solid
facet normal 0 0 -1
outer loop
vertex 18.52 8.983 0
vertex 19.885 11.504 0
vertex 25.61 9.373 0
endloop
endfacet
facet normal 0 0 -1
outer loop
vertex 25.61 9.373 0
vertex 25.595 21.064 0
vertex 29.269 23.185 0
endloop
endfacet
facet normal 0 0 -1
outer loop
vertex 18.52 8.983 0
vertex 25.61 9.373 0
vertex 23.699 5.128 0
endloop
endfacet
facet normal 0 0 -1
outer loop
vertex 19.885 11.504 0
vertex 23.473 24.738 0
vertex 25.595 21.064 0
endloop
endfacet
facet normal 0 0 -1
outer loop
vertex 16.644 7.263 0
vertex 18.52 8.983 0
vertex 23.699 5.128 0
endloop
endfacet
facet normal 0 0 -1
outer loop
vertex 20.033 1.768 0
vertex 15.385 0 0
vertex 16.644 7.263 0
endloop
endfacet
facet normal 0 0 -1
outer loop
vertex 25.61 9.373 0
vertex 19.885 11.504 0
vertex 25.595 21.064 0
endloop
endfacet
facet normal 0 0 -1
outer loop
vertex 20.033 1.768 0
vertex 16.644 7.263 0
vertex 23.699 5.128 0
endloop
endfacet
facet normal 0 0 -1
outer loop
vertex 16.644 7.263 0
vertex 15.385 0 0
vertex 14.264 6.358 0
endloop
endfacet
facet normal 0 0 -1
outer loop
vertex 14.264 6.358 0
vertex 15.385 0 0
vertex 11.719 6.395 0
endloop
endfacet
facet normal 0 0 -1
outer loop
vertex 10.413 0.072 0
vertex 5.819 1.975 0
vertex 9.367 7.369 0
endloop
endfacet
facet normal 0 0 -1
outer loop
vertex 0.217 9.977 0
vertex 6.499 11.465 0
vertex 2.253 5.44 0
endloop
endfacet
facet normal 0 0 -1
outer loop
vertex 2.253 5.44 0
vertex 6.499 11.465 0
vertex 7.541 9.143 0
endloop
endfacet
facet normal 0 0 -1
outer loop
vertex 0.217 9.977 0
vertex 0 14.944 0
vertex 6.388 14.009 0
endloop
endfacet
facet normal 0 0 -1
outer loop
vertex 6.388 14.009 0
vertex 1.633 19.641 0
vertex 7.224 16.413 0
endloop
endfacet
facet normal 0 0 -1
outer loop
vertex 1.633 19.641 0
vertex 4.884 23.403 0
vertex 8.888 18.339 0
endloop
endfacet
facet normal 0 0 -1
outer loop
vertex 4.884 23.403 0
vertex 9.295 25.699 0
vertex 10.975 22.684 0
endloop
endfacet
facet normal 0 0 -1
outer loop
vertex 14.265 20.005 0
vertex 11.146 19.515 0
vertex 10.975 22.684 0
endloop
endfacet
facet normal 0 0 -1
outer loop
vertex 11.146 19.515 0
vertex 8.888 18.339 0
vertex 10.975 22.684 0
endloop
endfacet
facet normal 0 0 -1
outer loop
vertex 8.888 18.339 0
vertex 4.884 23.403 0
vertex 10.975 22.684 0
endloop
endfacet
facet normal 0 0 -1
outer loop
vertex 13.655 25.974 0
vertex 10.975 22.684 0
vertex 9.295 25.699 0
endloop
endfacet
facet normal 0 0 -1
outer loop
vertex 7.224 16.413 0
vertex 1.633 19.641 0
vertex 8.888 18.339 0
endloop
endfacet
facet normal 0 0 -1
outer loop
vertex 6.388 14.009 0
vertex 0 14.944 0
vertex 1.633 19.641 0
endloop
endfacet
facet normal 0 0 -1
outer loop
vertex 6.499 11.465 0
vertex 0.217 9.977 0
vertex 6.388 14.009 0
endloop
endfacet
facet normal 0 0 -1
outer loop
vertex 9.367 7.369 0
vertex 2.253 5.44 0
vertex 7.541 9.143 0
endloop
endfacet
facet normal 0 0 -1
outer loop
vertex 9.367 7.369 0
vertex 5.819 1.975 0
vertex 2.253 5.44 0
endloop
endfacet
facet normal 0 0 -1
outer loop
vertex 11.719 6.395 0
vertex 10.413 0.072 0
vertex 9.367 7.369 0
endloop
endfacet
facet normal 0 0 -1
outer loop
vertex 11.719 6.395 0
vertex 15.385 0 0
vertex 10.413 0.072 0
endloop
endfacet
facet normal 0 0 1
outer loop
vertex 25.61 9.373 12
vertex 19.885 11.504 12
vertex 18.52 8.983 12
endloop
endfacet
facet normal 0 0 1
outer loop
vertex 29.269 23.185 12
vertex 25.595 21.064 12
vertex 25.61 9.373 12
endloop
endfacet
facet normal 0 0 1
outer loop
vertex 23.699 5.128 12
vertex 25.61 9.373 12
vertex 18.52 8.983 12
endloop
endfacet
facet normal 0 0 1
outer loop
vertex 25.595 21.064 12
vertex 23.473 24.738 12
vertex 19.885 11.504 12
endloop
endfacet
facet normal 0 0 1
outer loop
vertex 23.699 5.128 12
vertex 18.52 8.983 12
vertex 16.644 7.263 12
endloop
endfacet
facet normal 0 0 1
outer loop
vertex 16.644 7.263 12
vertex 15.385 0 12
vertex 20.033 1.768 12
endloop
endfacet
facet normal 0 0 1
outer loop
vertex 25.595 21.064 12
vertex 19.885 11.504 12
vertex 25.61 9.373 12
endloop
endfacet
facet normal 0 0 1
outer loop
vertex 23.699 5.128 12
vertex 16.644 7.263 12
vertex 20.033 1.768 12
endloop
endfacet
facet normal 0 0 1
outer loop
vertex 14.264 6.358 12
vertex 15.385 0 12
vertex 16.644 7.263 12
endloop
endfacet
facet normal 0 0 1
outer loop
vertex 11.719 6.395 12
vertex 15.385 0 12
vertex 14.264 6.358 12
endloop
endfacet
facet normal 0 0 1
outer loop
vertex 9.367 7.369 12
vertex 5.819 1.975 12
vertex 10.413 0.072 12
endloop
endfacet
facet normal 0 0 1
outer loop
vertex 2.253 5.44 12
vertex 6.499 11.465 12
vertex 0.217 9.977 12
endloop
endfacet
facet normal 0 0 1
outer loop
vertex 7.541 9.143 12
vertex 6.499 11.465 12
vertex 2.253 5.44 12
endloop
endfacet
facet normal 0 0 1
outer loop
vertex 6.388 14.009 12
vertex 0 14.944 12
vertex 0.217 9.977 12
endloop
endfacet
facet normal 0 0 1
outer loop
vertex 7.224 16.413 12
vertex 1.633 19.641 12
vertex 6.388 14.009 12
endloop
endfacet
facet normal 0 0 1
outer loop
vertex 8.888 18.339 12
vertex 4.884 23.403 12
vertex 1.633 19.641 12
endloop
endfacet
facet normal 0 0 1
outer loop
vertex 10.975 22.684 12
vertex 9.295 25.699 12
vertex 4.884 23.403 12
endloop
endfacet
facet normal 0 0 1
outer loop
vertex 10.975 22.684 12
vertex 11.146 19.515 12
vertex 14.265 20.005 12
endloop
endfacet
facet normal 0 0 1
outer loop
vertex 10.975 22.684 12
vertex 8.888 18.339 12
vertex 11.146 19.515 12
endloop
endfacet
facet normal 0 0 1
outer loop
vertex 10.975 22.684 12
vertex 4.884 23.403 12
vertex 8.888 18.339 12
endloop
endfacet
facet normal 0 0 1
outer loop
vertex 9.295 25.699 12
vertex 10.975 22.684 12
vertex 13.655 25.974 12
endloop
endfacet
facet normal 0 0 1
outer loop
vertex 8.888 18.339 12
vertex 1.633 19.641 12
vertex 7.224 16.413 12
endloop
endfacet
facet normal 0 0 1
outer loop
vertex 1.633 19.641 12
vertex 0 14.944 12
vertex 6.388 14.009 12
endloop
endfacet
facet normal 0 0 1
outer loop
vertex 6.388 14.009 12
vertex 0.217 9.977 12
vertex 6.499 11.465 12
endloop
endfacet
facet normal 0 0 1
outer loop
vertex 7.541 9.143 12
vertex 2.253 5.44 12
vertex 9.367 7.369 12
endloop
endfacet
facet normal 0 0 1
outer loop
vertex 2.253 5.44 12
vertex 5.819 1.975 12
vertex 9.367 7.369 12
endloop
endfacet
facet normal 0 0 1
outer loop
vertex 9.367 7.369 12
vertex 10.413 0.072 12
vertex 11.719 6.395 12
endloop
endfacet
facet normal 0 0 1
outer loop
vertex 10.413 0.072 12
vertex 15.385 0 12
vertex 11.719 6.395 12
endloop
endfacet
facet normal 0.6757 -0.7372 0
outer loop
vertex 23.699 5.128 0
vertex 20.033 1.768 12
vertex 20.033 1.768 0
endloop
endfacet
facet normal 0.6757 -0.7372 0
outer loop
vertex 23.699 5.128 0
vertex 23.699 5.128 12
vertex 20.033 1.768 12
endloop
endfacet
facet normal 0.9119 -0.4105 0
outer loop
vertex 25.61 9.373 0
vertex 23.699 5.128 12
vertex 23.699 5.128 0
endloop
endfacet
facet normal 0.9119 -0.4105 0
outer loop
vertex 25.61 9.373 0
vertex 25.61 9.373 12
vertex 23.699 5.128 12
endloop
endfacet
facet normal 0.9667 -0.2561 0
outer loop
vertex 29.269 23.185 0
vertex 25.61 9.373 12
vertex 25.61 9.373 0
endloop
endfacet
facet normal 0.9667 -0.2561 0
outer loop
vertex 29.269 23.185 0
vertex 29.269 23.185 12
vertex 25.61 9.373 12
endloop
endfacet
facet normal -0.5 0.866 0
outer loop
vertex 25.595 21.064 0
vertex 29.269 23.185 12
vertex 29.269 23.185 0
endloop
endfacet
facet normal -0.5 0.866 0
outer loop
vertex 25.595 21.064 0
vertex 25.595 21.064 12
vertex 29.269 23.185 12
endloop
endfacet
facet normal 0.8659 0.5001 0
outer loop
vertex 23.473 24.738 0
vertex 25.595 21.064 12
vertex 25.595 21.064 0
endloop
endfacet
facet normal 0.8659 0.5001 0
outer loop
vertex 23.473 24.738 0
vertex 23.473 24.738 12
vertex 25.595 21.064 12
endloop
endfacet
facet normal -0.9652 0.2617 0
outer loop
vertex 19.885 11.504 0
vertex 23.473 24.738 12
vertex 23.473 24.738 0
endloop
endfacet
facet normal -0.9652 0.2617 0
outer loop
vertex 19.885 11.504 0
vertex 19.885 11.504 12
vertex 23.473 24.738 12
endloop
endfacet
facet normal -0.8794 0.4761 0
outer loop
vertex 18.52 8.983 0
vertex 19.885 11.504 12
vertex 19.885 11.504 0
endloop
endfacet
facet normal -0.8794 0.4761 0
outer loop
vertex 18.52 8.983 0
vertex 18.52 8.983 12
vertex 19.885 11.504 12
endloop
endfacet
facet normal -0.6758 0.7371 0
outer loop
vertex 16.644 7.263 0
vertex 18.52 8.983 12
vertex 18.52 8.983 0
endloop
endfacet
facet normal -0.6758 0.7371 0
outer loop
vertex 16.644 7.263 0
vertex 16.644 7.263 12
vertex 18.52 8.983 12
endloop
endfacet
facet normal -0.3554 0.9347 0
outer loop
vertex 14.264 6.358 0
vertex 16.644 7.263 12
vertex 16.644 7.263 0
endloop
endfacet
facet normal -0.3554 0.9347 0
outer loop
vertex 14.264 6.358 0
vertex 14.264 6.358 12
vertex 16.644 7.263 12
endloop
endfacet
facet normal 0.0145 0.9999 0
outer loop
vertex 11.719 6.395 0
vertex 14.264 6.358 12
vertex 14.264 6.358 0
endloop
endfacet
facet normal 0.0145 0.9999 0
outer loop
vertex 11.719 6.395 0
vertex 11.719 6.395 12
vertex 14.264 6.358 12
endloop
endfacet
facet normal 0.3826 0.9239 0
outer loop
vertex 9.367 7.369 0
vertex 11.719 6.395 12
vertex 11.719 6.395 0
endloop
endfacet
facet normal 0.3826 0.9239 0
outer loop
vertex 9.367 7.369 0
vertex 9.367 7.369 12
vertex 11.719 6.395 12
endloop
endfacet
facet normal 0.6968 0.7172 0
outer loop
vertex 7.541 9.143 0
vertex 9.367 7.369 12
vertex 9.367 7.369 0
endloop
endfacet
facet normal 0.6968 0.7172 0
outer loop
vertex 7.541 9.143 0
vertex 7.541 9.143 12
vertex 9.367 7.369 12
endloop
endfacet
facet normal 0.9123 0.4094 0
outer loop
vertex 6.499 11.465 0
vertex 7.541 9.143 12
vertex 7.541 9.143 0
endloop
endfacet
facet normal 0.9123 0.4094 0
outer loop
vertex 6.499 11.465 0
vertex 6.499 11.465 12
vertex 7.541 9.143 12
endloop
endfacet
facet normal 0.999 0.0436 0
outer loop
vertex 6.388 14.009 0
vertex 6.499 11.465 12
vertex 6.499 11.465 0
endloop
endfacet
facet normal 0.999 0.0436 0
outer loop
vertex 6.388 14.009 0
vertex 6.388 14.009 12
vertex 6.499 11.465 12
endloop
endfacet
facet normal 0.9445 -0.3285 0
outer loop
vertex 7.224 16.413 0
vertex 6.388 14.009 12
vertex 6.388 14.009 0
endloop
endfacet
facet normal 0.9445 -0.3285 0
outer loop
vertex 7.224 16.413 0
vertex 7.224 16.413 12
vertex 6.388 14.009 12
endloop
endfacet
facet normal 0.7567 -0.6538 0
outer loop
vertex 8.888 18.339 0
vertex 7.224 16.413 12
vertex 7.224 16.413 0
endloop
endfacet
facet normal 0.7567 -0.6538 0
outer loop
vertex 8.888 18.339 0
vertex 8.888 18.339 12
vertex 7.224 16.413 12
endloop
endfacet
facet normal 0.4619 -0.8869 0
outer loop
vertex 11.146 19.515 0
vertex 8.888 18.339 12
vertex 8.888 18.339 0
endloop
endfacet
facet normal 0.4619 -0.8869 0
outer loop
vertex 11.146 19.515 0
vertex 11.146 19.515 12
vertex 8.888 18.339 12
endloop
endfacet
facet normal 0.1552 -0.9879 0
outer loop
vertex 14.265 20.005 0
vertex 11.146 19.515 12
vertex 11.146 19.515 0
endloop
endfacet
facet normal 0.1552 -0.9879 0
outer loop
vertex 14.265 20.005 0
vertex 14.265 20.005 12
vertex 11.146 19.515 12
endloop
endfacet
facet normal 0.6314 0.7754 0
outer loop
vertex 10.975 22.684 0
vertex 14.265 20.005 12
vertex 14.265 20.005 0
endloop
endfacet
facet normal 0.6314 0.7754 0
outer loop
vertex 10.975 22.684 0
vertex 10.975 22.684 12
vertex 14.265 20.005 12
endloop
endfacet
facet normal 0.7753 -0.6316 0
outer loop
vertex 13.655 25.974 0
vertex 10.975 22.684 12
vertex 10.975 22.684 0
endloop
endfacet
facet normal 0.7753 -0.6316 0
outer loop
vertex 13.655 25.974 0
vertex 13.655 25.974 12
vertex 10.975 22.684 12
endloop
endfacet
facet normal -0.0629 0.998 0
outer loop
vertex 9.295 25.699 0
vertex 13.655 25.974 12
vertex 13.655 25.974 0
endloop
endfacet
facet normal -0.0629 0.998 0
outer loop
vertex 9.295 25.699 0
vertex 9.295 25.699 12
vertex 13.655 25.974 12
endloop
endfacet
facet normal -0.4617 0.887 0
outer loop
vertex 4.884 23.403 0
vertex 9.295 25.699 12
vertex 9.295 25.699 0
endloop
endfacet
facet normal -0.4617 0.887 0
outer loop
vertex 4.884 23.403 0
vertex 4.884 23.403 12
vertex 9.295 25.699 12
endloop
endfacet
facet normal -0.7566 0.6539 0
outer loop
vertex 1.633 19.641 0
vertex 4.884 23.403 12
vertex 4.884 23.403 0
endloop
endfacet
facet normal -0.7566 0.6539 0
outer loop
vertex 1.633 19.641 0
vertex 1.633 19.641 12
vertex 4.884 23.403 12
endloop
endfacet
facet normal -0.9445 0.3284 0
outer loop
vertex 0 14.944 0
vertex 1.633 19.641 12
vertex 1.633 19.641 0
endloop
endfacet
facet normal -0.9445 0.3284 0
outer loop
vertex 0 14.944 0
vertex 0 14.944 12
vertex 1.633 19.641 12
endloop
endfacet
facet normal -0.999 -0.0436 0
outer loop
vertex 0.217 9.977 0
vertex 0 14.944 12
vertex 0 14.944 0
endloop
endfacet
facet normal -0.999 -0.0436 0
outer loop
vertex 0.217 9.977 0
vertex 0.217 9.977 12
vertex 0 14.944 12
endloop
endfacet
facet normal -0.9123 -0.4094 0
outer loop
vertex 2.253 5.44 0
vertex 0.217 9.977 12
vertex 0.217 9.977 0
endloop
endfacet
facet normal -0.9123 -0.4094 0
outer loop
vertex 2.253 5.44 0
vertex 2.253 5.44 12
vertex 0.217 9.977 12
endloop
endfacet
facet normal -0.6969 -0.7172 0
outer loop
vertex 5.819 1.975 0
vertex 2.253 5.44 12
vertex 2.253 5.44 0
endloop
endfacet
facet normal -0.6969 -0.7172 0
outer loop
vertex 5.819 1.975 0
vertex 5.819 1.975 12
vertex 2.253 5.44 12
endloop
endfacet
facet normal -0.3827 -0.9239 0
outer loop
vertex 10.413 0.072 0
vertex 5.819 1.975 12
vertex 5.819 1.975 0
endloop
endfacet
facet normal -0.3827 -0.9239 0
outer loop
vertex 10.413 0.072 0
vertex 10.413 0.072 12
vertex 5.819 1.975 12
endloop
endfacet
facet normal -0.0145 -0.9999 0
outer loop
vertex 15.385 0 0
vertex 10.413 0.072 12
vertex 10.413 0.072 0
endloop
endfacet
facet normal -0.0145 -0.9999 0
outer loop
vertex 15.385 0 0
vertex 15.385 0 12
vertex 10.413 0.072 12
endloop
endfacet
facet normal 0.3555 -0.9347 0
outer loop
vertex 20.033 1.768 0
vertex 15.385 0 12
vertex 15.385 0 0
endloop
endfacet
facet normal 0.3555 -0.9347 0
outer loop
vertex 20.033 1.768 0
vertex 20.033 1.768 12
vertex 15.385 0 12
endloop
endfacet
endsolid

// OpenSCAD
$fn = 32;

// ----------------------------------------------------------------------
// Eye lug: ring_tail, 12 mm thick
// ----------------------------------------------------------------------

// --- parameters (mm) ---
profile_height = 12;      // extrusion height
profile_points = 30;      // points of the closed outline

profile = [[10.975, 22.684], [13.655, 25.974], [9.295, 25.699], [4.884, 23.403], [1.633, 19.641], [0, 14.944], [0.217, 9.977], [2.253, 5.44], [5.819, 1.975], [10.413, 0.072], [15.385, 0], [20.033, 1.768], [23.699, 5.128], [25.61, 9.373], [29.269, 23.185], [25.595, 21.064], [23.473, 24.738], [19.885, 11.504], [18.52, 8.983], [16.644, 7.263], [14.264, 6.358], [11.719, 6.395], [9.367, 7.369], [7.541, 9.143], [6.499, 11.465], [6.388, 14.009], [7.224, 16.413], [8.888, 18.339], [11.146, 19.515], [14.265, 20.005]];  // single closed polygon, 30 points, counter clockwise

// --- the one profile operation ---
linear_extrude(height = profile_height) polygon(points = profile);
